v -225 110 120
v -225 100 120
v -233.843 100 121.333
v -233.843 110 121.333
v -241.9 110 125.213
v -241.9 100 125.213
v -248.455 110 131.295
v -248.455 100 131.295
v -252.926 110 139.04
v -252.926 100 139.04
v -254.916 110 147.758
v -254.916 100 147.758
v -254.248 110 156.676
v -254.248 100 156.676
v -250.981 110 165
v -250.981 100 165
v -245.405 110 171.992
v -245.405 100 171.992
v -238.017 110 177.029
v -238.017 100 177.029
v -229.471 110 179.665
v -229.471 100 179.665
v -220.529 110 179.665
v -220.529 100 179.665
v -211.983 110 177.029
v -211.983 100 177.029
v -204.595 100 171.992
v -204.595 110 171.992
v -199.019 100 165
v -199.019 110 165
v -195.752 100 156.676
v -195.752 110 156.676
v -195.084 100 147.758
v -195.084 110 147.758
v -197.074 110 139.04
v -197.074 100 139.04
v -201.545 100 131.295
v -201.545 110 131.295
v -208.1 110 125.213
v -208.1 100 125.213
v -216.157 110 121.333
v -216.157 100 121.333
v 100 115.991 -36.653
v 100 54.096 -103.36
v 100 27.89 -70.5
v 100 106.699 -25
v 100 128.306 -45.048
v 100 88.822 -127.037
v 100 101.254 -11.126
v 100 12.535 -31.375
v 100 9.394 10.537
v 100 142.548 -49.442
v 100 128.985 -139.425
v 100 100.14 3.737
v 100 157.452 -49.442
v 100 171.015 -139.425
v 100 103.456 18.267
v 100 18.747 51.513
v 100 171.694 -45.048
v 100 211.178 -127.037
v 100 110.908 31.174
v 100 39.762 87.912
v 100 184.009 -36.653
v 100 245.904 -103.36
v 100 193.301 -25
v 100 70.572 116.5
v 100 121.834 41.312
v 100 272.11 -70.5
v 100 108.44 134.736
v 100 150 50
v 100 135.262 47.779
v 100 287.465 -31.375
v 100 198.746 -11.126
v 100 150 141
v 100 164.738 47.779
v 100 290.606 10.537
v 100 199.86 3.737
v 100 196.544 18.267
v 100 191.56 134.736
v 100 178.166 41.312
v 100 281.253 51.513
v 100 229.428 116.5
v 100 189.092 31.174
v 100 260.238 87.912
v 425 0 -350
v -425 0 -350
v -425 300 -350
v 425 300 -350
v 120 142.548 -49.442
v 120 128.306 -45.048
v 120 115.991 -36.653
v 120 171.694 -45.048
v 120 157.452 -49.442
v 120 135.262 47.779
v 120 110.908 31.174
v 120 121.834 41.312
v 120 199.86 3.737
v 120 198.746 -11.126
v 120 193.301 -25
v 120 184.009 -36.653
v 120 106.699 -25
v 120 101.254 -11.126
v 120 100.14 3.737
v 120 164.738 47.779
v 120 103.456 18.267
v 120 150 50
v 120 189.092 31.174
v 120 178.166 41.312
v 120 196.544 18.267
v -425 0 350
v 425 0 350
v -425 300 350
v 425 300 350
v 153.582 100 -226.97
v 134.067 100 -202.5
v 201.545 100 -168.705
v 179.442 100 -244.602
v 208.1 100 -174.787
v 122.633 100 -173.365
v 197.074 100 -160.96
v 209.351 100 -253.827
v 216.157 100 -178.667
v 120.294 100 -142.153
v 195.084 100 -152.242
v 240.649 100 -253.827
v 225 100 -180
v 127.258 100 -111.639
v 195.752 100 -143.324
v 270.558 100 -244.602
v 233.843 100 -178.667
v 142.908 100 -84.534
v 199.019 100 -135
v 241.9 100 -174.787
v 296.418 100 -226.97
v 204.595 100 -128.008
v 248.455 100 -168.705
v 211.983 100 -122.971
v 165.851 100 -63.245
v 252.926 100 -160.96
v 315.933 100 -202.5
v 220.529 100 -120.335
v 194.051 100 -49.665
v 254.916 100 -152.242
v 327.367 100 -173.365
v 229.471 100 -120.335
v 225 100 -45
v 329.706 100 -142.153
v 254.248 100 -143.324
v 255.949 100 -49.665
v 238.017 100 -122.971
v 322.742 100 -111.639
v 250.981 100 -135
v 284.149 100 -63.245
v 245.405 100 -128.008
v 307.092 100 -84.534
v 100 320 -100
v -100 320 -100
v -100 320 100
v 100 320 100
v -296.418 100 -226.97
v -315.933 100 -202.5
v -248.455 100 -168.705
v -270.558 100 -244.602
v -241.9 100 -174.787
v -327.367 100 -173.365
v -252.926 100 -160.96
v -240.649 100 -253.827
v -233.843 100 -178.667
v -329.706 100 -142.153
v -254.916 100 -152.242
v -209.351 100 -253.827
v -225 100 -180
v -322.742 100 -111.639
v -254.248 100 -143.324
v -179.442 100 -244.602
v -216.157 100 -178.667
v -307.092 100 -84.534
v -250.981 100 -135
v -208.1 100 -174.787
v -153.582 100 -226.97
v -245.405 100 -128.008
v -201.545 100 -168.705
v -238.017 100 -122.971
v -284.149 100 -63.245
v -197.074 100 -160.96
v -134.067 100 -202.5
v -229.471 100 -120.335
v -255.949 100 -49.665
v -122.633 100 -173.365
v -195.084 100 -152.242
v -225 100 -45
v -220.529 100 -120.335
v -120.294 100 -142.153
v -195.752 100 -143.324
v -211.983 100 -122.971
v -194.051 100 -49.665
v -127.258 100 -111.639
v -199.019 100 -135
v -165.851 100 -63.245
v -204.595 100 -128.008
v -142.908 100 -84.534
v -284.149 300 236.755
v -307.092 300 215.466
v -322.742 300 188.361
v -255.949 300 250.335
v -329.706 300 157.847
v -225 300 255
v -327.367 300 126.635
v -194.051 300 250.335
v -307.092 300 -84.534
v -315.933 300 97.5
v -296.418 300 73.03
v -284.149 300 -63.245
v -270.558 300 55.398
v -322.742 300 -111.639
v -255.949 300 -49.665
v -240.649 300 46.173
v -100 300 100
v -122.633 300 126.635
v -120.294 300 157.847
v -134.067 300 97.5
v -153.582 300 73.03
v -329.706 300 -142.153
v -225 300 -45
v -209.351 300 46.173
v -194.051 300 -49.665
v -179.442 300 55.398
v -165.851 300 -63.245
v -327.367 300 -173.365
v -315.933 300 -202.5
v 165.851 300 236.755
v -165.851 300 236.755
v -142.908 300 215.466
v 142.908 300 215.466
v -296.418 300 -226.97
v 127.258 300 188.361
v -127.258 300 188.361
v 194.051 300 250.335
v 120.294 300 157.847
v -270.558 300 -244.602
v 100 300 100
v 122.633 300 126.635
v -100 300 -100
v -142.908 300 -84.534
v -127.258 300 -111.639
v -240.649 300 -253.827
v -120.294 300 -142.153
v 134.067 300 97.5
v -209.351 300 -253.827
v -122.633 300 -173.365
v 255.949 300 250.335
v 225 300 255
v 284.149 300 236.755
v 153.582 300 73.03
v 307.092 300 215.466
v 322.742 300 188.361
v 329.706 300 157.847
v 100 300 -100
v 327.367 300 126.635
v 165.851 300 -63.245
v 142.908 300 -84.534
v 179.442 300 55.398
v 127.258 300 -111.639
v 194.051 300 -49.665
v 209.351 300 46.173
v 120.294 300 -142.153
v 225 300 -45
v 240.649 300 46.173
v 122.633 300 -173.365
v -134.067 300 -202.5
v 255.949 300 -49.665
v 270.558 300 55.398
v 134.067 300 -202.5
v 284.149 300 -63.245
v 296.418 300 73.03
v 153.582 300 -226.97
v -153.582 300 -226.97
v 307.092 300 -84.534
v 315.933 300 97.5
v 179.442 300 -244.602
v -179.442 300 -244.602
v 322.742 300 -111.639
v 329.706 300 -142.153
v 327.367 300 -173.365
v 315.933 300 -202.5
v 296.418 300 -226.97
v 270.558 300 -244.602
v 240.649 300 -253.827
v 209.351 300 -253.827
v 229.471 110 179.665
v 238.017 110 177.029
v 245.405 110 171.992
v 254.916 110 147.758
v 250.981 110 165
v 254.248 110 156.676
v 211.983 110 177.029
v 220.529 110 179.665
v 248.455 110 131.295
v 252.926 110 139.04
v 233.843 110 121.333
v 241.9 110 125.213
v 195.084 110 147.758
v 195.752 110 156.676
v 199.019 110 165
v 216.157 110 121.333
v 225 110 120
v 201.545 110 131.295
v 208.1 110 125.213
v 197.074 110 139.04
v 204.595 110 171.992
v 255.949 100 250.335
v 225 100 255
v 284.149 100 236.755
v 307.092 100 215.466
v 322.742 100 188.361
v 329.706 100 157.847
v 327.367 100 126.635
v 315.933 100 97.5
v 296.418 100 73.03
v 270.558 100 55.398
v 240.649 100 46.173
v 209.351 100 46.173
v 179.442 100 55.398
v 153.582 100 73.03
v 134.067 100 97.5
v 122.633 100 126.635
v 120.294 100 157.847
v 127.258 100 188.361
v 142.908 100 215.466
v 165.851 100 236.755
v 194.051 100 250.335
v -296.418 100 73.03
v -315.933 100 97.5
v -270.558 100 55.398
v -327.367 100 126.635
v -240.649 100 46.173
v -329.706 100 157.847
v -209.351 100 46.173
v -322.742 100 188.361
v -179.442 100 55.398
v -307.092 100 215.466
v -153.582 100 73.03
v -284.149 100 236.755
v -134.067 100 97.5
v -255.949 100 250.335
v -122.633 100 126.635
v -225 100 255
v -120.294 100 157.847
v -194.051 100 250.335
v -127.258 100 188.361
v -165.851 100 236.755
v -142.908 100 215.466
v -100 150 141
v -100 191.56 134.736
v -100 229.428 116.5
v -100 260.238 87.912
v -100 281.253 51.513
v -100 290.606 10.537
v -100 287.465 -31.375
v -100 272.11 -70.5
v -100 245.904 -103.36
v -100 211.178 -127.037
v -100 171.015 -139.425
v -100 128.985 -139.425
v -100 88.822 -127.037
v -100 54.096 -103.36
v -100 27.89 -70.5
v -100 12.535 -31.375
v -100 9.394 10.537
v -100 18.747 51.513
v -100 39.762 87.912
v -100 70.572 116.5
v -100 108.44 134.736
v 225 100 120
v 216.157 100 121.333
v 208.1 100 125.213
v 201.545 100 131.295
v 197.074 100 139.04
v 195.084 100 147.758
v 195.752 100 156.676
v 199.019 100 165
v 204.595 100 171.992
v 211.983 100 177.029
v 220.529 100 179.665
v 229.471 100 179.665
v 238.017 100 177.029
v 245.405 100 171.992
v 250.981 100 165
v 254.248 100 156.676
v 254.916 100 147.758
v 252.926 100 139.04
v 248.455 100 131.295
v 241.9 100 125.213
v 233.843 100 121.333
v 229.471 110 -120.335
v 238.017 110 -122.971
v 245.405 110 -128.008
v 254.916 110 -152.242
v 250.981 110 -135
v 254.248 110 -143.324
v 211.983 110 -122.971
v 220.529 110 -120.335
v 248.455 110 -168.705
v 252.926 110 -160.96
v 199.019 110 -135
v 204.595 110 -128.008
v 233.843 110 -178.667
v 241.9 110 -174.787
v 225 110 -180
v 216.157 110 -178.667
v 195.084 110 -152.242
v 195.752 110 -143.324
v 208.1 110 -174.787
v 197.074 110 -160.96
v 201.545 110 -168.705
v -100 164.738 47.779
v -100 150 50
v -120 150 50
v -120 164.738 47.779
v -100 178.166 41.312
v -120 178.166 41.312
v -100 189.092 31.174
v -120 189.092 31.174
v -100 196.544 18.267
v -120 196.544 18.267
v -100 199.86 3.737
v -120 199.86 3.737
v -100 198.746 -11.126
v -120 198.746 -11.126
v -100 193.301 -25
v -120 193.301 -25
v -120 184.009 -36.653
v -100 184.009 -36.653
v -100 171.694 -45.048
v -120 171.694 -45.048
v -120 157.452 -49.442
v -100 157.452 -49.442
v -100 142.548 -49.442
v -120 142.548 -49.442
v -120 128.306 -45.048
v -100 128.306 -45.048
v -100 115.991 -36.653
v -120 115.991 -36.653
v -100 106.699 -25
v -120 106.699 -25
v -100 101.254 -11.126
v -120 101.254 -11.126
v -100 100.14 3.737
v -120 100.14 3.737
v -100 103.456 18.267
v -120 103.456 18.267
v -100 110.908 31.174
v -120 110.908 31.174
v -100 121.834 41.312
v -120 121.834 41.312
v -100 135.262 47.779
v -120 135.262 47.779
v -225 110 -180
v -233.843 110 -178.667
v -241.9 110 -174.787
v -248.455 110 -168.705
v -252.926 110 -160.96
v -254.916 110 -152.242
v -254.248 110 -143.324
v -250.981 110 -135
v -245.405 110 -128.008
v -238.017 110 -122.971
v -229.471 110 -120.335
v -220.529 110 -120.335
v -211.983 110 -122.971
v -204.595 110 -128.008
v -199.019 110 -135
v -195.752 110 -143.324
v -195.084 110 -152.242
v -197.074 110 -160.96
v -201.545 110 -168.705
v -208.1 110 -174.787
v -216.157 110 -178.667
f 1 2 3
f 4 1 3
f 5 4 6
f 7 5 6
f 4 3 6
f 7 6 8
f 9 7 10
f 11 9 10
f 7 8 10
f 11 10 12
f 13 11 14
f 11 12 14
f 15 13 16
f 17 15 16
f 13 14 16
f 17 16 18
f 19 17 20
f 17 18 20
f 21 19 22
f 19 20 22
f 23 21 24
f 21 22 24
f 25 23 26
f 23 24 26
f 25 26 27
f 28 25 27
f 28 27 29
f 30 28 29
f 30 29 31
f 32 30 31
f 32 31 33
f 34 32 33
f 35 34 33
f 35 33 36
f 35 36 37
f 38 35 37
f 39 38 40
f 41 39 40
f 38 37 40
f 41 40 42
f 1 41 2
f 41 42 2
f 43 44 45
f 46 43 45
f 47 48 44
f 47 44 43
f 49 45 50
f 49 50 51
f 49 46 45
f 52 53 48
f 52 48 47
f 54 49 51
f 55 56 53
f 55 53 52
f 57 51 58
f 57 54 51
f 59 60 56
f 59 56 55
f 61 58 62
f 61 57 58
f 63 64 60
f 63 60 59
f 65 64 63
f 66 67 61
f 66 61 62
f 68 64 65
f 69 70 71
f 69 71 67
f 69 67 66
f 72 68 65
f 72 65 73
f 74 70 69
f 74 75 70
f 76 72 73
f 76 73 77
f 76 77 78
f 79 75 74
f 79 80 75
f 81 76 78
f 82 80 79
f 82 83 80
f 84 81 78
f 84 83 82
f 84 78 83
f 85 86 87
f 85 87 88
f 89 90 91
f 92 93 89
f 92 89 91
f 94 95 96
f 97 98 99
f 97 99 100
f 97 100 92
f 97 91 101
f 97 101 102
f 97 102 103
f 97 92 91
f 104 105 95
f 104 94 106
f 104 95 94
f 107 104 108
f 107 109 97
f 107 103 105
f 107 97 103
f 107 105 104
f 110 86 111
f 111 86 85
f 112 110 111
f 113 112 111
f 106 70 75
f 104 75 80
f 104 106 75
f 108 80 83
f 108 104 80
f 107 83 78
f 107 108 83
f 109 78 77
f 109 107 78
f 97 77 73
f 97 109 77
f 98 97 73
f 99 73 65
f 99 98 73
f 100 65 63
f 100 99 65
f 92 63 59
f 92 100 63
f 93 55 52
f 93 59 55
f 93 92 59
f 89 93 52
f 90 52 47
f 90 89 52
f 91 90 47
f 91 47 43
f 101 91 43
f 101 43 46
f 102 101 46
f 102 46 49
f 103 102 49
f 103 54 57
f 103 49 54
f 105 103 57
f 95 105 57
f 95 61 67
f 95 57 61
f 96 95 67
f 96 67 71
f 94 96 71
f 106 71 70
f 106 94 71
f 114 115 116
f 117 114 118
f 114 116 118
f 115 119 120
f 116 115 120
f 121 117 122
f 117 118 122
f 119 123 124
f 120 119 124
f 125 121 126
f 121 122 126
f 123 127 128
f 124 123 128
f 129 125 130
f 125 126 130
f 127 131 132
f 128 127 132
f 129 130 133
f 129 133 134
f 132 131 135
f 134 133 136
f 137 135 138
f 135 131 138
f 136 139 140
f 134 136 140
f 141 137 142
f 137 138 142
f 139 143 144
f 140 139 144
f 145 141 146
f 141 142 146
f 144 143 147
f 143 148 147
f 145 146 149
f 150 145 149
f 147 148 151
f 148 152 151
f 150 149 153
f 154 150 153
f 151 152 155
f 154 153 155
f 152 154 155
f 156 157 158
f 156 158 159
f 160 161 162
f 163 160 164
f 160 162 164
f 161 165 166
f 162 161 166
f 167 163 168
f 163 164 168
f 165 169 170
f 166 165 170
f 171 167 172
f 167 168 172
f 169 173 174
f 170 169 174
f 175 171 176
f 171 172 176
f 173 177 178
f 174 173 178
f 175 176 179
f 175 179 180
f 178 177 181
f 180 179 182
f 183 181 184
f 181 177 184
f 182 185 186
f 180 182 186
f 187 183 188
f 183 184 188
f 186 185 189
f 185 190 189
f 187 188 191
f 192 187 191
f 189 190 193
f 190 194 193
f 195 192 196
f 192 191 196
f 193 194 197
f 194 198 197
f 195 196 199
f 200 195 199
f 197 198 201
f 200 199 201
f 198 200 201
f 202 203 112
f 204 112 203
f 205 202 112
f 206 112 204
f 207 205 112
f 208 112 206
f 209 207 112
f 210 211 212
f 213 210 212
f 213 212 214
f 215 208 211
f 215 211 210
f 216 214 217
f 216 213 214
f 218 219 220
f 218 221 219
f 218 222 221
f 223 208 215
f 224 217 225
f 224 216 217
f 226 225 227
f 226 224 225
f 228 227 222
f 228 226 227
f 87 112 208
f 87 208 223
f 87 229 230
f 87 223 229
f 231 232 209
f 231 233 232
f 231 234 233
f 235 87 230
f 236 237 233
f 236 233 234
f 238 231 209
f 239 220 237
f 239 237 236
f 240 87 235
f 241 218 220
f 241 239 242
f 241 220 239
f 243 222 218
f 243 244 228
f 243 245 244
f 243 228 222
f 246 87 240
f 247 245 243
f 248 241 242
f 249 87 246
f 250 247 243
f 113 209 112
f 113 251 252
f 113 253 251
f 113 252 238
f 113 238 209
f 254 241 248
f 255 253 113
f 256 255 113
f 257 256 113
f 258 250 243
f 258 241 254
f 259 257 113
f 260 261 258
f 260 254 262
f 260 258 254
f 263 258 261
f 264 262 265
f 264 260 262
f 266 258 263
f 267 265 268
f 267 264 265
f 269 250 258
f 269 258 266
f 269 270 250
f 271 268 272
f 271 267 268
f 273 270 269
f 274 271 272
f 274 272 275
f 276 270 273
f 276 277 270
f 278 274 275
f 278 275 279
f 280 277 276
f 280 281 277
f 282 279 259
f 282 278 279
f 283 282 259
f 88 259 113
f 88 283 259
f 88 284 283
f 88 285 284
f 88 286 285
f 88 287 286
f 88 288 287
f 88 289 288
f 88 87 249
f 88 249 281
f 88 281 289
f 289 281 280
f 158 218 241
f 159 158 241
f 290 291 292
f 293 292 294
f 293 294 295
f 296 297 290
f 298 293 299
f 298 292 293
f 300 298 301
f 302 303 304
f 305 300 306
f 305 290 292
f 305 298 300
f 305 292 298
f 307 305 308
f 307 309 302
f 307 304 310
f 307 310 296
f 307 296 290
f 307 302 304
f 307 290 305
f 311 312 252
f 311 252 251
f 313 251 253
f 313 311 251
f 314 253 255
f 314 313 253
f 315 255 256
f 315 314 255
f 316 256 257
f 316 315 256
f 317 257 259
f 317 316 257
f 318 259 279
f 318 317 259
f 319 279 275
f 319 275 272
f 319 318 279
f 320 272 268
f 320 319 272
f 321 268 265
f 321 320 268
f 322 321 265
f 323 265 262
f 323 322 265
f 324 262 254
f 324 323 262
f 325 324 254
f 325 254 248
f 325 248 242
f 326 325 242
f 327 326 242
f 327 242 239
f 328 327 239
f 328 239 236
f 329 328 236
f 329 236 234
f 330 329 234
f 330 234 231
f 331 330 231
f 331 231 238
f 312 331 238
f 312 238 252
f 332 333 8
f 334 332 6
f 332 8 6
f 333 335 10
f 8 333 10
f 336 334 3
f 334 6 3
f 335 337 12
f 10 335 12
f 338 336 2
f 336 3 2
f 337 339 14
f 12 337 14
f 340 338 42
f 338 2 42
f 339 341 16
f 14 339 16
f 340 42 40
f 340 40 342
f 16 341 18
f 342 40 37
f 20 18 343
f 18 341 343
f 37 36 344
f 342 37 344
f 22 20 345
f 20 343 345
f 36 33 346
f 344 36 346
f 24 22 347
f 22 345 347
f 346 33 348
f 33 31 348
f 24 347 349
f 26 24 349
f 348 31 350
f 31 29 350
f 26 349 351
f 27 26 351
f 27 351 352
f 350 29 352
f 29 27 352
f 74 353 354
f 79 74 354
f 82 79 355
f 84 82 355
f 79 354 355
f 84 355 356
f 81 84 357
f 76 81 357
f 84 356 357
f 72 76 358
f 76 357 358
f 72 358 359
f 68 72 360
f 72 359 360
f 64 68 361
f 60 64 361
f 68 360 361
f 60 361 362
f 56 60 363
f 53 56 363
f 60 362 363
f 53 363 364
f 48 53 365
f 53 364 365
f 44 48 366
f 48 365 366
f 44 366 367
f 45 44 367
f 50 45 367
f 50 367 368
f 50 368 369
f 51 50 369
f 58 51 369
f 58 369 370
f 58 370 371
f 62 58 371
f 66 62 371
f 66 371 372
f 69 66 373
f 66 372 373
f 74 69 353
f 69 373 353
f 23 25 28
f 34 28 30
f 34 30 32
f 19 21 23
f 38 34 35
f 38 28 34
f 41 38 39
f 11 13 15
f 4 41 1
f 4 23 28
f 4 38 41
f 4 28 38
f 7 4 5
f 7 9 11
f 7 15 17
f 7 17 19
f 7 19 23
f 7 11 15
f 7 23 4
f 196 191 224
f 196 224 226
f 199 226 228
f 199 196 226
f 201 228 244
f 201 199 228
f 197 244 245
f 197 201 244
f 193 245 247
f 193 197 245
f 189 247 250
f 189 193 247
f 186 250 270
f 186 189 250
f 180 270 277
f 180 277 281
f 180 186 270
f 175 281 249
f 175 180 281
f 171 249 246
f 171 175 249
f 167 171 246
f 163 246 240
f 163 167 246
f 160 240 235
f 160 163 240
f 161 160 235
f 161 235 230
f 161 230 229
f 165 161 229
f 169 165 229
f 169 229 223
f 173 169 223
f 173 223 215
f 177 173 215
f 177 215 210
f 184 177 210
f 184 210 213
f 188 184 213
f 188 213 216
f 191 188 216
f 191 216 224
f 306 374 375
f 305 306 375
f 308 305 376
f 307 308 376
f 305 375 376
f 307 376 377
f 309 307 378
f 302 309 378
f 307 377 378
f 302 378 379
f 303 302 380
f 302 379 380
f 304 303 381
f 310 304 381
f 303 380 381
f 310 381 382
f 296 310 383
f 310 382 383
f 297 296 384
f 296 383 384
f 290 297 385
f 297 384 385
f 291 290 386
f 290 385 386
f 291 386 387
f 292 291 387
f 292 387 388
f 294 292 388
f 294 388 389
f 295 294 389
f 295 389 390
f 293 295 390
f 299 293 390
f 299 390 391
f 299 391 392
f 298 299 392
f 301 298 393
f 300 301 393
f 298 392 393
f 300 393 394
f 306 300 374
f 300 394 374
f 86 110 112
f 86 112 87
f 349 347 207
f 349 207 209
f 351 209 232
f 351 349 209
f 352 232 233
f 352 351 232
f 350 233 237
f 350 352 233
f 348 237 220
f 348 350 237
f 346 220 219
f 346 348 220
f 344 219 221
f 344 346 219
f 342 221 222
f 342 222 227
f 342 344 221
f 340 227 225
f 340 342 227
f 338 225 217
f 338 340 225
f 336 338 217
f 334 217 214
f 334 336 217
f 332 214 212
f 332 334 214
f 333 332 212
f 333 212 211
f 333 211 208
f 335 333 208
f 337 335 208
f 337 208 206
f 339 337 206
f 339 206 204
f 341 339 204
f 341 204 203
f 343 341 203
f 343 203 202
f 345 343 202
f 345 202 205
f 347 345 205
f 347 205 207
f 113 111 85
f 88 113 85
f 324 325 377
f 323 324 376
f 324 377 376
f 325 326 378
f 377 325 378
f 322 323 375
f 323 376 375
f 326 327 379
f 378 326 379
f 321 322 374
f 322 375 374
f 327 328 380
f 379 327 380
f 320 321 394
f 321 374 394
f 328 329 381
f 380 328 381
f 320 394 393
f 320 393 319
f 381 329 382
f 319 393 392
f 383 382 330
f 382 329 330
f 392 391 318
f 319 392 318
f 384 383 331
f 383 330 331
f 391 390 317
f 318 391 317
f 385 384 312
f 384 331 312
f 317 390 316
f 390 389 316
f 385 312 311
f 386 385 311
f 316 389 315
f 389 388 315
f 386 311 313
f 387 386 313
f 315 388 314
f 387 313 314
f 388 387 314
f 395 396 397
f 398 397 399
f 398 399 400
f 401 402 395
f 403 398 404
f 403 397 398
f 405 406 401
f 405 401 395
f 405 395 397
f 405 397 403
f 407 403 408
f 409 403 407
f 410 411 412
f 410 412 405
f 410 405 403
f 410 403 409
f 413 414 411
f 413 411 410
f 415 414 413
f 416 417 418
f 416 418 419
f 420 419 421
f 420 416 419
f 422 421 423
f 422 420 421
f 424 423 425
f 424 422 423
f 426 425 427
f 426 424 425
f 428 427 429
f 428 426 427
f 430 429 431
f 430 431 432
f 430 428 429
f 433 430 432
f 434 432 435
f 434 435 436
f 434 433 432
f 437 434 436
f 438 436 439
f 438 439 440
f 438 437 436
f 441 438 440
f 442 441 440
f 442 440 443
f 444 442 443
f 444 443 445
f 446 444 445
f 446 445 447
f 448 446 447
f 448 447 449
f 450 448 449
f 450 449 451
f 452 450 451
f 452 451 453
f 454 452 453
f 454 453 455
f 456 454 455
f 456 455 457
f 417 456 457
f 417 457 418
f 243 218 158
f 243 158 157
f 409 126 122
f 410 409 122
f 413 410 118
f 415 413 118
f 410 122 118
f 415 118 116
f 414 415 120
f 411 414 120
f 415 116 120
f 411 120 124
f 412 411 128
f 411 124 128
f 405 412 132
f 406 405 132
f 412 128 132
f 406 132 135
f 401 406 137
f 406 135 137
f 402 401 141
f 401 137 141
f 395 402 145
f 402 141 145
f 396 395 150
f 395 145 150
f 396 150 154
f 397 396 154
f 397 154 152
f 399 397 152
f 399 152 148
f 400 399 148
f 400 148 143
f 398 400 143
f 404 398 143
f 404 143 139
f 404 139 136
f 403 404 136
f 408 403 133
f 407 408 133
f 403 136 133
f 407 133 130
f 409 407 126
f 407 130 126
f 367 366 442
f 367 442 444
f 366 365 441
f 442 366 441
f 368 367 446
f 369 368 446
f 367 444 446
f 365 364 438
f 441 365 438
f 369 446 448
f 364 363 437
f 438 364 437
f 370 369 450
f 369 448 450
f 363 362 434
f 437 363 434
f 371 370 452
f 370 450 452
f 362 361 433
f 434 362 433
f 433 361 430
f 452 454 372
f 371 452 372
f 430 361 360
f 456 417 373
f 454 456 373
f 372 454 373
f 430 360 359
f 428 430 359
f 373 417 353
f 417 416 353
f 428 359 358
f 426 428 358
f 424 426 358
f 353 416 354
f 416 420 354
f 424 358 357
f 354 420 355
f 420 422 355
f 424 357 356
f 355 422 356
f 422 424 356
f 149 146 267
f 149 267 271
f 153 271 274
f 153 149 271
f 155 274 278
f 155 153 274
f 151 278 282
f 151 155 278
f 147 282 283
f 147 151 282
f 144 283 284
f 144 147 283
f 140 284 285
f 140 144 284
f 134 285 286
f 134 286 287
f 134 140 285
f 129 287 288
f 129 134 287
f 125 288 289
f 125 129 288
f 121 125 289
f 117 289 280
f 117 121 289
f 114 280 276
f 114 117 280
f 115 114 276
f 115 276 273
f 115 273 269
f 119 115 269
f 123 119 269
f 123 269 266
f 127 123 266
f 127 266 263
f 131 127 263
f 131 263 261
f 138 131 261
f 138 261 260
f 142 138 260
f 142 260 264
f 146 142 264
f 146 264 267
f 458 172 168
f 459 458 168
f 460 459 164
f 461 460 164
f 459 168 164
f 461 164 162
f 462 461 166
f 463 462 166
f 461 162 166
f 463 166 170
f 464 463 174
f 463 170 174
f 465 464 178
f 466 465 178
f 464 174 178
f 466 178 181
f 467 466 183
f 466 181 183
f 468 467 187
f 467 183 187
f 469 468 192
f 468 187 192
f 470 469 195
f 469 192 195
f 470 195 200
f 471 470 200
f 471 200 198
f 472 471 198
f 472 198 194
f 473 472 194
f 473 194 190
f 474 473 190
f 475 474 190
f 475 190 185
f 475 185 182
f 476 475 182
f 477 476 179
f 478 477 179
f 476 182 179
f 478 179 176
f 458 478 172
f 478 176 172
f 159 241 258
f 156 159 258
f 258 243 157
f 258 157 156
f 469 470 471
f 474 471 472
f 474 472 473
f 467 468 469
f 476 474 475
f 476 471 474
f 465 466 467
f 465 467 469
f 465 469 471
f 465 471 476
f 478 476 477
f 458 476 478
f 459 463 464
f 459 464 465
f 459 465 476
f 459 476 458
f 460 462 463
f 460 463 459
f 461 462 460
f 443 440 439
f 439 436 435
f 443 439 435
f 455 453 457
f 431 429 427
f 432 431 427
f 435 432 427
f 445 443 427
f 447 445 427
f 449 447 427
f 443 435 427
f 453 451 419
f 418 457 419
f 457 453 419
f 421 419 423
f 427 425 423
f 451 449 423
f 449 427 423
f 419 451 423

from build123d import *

# Parameters (mm, degrees)
SKETCH1_W               = 850
SKETCH1_H               = 700
SKETCH1_R               = 105
BOSS_EXTRUDE1_DEPTH     = 300
SKETCH2_W               = 718.724675112
SKETCH2_H               = 607.354725455
BOSS_EXTRUDE2_DEPTH     = 100
SKETCH3_R               = 30
BOSS_EXTRUDE3_DEPTH     = 10
CUT_EXTRUDE1_START      = -325
SKETCH4_R               = 141
CUT_EXTRUDE1_DEPTH      = 200
CUT_EXTRUDE2_DEPTH      = 220
CUT_EXTRUDE2_DEPTH_BACK = 20
SKETCH5_R               = 50
SKETCH6_W               = 200
SKETCH6_H               = 200
BOSS_EXTRUDE4_DEPTH     = 20


with BuildPart() as part:
    # Sketch1 → Boss-Extrude1 (new body)
    with BuildSketch(Plane(origin=(0, 0, 0), x_dir=(1, 0, 0), z_dir=(0, 1, 0))):
        Rectangle(SKETCH1_W, SKETCH1_H)
        with Locations(Location((-225, 150, 0), (0, 0, 270))):
            Circle(SKETCH1_R, mode=Mode.SUBTRACT)
        with Locations(Location((225, 150, 0), (0, 0, 270))):
            Circle(SKETCH1_R, mode=Mode.SUBTRACT)
        with Locations(Location((-225, -150, 0), (0, 0, 270))):
            Circle(SKETCH1_R, mode=Mode.SUBTRACT)
        with Locations(Location((225, -150, 0), (0, 0, 270))):
            Circle(SKETCH1_R, mode=Mode.SUBTRACT)
    extrude(amount=BOSS_EXTRUDE1_DEPTH)

    # Sketch2 → Boss-Extrude2 (add)
    with BuildSketch(Plane.XZ):
        with Locations((3.884998244, -5.179997659)):
            Rectangle(SKETCH2_W, SKETCH2_H)
    extrude(amount=-BOSS_EXTRUDE2_DEPTH)

    # Sketch3 → Boss-Extrude3 (add)
    with BuildSketch(Plane(origin=(0, 100, 0), x_dir=(1, 0, 0), z_dir=(0, 1, 0))):
        with Locations(Location((-225, 150, 0), (0, 0, 90))):
            Circle(SKETCH3_R)
        with Locations(Location((225, 150, 0), (0, 0, 90))):
            Circle(SKETCH3_R)
        with Locations(Location((225, -150, 0), (0, 0, 90))):
            Circle(SKETCH3_R)
        with Locations(Location((-225, -150, 0), (0, 0, 90))):
            Circle(SKETCH3_R)
    extrude(amount=BOSS_EXTRUDE3_DEPTH)

    # Sketch4 → Cut-Extrude1 (cut)
    with BuildSketch(Plane.ZY.offset(425).offset(CUT_EXTRUDE1_START)):
        with Locations((0, 150)):
            Circle(SKETCH4_R)
    extrude(amount=-CUT_EXTRUDE1_DEPTH, mode=Mode.SUBTRACT)

    # Sketch5 → Cut-Extrude2 (cut, two sides: drawn at the far end of the back side and taken through both)
    with BuildSketch(Plane.ZY.offset(-100).offset(-CUT_EXTRUDE2_DEPTH_BACK)):
        with Locations((0, 150)):
            Circle(SKETCH5_R)
    extrude(amount=CUT_EXTRUDE2_DEPTH + CUT_EXTRUDE2_DEPTH_BACK, mode=Mode.SUBTRACT)

    # Sketch6 → Boss-Extrude4 (add)
    with BuildSketch(Plane(origin=(0, 300, 0), x_dir=(1, 0, 0), z_dir=(0, 1, 0))):
        Rectangle(SKETCH6_W, SKETCH6_H)
    extrude(amount=BOSS_EXTRUDE4_DEPTH)


solid = part.part
